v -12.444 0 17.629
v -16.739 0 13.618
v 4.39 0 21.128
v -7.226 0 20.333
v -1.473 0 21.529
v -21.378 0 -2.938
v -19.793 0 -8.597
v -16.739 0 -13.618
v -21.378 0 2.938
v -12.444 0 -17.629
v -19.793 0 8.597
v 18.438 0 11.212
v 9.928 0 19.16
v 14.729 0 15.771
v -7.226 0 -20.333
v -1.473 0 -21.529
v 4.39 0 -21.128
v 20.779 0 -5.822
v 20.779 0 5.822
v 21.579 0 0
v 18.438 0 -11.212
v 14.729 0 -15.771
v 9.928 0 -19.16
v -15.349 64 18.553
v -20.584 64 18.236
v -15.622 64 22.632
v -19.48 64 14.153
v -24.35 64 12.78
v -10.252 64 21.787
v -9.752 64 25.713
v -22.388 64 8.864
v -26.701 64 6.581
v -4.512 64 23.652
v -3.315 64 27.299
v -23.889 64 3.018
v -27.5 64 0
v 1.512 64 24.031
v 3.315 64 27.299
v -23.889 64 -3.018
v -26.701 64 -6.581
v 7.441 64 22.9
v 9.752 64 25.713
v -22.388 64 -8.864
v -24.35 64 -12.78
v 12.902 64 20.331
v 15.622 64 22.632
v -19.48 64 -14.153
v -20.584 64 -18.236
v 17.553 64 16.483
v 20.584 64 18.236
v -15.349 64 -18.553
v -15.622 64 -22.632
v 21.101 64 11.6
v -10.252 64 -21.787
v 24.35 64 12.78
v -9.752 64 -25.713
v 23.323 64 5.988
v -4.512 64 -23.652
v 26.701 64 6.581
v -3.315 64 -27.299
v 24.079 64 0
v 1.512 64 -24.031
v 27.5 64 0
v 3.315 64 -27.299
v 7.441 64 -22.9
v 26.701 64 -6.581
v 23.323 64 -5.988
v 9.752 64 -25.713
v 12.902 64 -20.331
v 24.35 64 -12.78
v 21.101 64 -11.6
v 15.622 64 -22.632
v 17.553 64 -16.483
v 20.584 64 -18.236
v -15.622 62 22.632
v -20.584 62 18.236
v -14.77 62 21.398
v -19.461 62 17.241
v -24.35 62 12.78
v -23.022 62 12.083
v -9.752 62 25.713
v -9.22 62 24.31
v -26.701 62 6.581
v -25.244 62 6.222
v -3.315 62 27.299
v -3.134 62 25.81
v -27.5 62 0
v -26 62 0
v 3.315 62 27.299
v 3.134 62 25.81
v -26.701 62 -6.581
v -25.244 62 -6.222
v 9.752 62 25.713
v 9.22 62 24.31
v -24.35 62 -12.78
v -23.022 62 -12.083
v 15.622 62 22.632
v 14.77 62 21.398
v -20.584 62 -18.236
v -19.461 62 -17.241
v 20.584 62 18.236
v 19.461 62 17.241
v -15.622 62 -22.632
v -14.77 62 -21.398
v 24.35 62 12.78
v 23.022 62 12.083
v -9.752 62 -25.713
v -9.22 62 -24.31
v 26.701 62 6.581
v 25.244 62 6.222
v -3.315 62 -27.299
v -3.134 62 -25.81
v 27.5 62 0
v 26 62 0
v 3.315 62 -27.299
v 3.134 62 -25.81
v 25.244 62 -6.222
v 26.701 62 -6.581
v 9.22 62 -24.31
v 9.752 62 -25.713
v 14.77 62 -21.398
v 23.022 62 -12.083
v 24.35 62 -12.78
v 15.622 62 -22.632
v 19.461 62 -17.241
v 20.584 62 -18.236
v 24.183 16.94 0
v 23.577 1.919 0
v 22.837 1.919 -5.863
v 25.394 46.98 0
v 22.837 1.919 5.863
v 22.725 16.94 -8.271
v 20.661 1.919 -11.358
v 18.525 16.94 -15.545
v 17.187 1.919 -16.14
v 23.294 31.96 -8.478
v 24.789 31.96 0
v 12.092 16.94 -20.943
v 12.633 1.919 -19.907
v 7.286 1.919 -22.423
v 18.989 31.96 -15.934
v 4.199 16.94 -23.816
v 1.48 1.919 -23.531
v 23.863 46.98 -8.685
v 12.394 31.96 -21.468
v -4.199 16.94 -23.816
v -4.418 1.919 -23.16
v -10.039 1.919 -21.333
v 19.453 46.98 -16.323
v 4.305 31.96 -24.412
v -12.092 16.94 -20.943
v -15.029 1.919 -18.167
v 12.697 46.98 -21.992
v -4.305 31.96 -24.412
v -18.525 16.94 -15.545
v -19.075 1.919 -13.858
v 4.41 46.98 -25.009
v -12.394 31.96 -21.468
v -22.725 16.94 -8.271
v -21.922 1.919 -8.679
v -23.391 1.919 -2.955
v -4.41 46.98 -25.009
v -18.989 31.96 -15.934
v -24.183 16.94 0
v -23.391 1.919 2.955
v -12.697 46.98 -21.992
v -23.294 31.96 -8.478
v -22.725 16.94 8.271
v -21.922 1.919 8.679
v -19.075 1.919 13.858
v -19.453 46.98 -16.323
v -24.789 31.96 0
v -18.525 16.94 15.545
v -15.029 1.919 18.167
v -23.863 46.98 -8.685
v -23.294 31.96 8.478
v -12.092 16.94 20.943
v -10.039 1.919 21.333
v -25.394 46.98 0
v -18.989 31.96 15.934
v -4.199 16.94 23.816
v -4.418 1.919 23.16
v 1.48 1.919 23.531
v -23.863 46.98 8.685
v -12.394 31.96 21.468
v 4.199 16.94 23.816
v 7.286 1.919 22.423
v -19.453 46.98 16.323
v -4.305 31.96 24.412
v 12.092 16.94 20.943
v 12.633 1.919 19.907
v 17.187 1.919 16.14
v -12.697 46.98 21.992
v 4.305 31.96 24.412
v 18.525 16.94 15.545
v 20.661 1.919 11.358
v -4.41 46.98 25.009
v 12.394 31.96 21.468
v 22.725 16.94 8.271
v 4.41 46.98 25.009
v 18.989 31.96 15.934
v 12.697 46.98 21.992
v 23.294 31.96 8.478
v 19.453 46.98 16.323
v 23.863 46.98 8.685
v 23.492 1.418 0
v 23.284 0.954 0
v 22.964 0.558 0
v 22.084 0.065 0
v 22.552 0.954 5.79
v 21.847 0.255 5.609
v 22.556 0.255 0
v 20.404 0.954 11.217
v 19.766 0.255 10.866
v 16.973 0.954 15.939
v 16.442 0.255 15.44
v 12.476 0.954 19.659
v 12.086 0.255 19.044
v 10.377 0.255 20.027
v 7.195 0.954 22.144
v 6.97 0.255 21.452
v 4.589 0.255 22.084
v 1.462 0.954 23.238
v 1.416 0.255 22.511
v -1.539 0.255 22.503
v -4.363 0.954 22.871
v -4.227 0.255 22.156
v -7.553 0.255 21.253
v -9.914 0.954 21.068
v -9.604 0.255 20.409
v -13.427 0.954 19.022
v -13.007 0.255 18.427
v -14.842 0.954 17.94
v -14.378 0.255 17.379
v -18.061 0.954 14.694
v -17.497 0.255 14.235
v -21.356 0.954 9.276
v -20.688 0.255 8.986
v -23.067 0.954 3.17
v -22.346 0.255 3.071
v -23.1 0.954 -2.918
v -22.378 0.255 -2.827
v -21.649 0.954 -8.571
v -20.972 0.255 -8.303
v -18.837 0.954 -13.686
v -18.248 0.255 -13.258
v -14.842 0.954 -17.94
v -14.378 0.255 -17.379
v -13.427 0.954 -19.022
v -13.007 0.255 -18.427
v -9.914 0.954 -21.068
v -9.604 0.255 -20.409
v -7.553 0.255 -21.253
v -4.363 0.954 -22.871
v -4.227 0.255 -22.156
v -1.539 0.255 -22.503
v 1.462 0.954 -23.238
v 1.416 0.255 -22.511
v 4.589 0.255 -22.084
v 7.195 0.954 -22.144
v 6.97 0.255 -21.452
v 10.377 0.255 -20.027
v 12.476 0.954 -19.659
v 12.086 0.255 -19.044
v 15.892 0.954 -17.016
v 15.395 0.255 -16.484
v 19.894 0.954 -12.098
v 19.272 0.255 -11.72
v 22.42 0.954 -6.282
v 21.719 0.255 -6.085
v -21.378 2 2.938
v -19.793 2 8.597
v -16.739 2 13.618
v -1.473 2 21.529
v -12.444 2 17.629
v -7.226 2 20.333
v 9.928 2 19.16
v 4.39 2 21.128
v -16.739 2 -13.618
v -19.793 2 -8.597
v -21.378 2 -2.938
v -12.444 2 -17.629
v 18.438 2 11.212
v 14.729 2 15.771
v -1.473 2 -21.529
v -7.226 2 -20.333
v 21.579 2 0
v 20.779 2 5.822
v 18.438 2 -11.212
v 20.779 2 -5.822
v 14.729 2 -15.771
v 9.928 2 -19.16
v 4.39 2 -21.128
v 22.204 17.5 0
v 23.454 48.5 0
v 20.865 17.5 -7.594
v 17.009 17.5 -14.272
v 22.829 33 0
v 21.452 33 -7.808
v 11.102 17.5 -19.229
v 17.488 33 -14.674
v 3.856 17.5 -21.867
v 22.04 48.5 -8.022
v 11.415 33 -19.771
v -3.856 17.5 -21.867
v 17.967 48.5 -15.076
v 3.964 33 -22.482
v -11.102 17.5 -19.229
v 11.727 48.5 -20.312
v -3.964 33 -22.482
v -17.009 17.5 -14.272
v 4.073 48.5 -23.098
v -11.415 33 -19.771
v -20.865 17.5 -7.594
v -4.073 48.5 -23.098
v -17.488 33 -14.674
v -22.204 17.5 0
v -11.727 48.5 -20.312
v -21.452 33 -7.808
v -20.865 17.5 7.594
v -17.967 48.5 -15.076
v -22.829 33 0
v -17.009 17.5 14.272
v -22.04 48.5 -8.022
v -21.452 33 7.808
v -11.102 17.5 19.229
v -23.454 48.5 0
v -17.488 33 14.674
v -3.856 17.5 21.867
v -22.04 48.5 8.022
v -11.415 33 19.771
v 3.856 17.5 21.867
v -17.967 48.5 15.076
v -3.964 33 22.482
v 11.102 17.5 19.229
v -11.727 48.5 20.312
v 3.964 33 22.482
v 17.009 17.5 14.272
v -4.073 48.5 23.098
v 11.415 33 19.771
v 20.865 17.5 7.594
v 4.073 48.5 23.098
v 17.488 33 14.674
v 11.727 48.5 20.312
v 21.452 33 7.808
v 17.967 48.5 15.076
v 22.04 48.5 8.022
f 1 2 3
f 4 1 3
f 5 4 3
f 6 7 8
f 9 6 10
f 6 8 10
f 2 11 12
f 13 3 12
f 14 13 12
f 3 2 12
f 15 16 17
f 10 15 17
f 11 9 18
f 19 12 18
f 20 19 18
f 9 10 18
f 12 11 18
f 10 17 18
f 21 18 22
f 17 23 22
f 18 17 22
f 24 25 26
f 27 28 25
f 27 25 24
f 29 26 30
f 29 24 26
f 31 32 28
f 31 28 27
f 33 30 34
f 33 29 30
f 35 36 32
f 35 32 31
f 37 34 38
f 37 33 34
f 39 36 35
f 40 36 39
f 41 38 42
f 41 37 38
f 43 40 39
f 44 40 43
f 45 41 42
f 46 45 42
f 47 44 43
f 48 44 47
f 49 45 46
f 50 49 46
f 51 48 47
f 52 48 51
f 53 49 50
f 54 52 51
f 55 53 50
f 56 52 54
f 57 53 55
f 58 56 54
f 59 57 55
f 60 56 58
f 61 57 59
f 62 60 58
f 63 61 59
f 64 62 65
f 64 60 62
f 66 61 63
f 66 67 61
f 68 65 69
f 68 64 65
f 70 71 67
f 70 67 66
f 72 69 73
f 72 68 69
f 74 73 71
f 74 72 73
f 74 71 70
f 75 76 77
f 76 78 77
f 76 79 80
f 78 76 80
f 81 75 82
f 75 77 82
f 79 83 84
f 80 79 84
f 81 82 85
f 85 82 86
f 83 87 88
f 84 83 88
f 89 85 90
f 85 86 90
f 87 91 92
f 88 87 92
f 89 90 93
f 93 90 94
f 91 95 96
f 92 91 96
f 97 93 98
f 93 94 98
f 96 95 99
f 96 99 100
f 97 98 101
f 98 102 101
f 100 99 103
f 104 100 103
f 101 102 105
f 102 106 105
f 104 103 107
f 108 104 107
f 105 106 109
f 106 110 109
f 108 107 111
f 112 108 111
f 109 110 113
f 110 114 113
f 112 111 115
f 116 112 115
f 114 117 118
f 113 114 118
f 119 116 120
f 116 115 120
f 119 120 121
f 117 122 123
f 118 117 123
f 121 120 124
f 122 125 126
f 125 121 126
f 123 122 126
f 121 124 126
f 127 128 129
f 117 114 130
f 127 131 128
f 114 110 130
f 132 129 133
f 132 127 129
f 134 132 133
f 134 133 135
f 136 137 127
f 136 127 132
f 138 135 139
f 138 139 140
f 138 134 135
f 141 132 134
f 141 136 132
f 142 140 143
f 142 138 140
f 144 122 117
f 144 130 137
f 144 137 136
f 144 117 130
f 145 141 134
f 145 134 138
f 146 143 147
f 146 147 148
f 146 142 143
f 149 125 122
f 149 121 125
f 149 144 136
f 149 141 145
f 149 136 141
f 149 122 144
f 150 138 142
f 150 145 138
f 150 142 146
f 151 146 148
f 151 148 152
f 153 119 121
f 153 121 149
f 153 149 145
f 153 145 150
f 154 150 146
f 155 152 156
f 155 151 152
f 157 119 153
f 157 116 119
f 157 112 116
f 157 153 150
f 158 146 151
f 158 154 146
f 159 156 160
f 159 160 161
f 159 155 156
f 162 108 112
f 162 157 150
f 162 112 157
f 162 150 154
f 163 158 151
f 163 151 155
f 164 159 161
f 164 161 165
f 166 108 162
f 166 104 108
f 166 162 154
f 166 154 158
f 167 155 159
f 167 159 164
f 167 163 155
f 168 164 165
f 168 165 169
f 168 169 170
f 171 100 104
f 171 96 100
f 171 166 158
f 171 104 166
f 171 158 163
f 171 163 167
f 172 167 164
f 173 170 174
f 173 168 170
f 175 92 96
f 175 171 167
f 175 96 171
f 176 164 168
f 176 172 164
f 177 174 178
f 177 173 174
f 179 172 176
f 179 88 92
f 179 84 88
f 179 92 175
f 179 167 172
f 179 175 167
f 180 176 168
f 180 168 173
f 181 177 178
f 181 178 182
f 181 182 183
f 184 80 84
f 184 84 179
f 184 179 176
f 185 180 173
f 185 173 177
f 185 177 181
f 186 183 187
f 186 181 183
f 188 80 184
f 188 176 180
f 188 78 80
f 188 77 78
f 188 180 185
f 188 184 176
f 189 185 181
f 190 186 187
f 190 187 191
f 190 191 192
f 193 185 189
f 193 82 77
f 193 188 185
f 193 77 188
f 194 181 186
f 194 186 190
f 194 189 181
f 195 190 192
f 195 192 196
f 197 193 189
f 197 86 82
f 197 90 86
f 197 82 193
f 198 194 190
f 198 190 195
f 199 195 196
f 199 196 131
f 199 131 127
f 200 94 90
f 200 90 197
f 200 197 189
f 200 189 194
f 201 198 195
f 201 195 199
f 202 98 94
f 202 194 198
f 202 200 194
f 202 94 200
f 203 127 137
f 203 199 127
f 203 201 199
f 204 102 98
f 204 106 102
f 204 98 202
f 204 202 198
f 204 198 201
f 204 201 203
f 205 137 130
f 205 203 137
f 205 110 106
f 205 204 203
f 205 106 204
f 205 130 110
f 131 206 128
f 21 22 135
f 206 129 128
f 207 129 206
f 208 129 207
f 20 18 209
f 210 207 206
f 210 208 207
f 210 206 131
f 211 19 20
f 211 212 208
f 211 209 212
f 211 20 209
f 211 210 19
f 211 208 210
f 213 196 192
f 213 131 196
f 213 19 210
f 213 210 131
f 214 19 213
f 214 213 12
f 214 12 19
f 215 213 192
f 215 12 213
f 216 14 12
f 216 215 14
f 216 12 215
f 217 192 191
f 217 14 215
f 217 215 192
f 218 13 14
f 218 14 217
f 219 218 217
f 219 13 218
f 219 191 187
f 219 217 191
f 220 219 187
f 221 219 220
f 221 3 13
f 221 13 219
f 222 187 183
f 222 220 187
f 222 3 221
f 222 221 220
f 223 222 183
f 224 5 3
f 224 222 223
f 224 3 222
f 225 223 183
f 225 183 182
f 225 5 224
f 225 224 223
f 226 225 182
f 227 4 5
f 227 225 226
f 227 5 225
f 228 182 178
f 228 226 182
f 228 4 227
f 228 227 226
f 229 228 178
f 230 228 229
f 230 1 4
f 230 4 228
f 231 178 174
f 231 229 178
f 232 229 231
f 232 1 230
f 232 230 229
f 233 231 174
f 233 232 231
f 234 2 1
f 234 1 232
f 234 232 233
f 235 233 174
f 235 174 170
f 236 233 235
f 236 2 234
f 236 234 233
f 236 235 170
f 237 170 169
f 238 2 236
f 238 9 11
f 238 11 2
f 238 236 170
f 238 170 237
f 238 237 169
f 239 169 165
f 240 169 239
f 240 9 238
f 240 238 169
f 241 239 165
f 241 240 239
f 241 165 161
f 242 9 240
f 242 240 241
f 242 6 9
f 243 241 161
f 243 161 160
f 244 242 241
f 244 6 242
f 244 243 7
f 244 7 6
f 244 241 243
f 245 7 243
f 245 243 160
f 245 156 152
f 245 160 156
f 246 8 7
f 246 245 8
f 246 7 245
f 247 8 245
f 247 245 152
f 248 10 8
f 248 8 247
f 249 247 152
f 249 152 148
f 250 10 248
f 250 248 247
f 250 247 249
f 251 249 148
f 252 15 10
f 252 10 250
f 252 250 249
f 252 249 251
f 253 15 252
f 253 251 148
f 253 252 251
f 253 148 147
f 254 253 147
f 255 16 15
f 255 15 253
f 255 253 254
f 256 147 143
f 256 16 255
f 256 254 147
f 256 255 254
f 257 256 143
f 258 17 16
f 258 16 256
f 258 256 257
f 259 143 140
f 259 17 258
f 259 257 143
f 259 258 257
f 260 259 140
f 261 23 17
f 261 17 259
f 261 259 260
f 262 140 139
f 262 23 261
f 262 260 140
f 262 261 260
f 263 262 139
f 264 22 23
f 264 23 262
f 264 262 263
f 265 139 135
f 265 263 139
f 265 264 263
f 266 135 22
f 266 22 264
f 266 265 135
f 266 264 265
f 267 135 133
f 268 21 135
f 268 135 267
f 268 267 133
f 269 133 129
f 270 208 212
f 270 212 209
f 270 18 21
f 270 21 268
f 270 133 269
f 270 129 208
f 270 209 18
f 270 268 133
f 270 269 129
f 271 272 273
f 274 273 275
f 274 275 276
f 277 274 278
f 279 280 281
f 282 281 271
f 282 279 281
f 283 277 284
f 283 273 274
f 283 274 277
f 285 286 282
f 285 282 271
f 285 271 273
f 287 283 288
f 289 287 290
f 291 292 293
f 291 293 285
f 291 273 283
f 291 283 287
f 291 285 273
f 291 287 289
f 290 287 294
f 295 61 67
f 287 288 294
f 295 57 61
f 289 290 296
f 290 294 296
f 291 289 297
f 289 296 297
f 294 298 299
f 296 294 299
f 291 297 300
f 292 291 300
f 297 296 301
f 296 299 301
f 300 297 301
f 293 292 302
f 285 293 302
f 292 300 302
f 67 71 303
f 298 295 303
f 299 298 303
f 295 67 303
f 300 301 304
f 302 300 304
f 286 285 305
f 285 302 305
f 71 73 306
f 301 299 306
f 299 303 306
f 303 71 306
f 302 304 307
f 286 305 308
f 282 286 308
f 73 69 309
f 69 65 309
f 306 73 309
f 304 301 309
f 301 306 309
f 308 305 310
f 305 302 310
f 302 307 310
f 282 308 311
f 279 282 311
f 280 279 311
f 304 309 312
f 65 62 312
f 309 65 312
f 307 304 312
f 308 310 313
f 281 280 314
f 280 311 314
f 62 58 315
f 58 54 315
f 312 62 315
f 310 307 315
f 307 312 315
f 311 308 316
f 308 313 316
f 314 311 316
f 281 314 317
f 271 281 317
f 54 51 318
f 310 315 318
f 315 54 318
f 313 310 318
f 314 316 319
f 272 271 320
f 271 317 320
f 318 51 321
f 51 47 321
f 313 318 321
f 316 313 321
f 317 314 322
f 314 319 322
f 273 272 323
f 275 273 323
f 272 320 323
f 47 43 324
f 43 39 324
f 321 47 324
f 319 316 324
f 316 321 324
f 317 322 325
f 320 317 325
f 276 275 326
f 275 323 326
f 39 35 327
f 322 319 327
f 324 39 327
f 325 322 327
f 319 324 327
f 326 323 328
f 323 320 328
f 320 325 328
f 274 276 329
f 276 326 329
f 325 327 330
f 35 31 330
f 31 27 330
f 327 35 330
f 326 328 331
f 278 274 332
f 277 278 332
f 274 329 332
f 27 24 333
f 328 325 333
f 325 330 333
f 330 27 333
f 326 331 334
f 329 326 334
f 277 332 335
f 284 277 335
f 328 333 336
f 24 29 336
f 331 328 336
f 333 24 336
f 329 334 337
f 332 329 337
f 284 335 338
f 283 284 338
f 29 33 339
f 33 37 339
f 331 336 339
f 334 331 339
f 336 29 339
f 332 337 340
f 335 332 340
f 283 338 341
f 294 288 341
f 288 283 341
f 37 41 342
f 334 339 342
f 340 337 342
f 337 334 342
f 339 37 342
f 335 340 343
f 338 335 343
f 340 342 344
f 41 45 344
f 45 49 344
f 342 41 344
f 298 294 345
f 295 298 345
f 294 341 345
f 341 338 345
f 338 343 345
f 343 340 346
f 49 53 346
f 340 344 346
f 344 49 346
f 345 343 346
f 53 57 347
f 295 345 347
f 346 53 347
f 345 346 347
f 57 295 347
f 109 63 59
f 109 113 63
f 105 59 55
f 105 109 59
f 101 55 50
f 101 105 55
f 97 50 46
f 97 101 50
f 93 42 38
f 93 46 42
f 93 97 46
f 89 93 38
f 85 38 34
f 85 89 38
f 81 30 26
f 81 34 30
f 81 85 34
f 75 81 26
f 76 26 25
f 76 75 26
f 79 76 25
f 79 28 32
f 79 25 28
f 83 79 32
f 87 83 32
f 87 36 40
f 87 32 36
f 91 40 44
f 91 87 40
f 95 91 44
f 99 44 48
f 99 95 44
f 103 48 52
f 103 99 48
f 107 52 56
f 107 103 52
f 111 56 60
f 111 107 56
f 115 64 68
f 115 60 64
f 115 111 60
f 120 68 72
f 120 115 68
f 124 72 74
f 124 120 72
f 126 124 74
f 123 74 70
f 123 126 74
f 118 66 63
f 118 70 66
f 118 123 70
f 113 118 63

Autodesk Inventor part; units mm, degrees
ref_plane "YZ Plane" through (0, 0, 0) normal (1, 0, 0) x (0, 1, 0)
ref_plane "XZ Plane" through (0, 0, 0) normal (0, 1, 0) x (-1, 0, 0)
ref_plane "XY Plane" through (0, 0, 0) normal (0, 0, 1) x (1, 0, 0)
sketch "Эскиз1" plane through (0, 0, 0) normal (0, 0, 1) x (1, 0, 0)
  line L0 (0, 0) -> (0, 57.7087)
  line L1 (0, 0) -> (87.3611, 0) construction
  line L2 (21.4984, 0) -> (24.079, 64)
  line L3 (24.079, 64) -> (27.5, 64)
  line L4 (27.5, 64) -> (27.5, 62)
  line L5 (27.5, 62) -> (26, 62)
  line L6 (26, 62) -> (23.5, 0)
  line L7 (21.4984, 0) -> (23.5, 0)
  line L8 (23.5, 0) -> (0, 0)
  line L9 (0, 0) -> (0, 2)
  line L10 (0, 2) -> (21.579, 2)
  dimension "d0" = 47
  dimension "d1" = 52
  dimension "d2" = 55
  dimension "d3" = 62
  dimension "d4" = 2
  dimension "d5" = 2
  dimension "d8" = 2
revolve "Вращение1" add sketch "Эскиз1" angle 360 about axis through (0, 0, 0) along (0, 1, 0)
fillet "Сопряжение1" radius 2 1 edges at (-23.5, 0, 0)
equation "\"d8\" = d4"
properties part number "Стакан_В2"
